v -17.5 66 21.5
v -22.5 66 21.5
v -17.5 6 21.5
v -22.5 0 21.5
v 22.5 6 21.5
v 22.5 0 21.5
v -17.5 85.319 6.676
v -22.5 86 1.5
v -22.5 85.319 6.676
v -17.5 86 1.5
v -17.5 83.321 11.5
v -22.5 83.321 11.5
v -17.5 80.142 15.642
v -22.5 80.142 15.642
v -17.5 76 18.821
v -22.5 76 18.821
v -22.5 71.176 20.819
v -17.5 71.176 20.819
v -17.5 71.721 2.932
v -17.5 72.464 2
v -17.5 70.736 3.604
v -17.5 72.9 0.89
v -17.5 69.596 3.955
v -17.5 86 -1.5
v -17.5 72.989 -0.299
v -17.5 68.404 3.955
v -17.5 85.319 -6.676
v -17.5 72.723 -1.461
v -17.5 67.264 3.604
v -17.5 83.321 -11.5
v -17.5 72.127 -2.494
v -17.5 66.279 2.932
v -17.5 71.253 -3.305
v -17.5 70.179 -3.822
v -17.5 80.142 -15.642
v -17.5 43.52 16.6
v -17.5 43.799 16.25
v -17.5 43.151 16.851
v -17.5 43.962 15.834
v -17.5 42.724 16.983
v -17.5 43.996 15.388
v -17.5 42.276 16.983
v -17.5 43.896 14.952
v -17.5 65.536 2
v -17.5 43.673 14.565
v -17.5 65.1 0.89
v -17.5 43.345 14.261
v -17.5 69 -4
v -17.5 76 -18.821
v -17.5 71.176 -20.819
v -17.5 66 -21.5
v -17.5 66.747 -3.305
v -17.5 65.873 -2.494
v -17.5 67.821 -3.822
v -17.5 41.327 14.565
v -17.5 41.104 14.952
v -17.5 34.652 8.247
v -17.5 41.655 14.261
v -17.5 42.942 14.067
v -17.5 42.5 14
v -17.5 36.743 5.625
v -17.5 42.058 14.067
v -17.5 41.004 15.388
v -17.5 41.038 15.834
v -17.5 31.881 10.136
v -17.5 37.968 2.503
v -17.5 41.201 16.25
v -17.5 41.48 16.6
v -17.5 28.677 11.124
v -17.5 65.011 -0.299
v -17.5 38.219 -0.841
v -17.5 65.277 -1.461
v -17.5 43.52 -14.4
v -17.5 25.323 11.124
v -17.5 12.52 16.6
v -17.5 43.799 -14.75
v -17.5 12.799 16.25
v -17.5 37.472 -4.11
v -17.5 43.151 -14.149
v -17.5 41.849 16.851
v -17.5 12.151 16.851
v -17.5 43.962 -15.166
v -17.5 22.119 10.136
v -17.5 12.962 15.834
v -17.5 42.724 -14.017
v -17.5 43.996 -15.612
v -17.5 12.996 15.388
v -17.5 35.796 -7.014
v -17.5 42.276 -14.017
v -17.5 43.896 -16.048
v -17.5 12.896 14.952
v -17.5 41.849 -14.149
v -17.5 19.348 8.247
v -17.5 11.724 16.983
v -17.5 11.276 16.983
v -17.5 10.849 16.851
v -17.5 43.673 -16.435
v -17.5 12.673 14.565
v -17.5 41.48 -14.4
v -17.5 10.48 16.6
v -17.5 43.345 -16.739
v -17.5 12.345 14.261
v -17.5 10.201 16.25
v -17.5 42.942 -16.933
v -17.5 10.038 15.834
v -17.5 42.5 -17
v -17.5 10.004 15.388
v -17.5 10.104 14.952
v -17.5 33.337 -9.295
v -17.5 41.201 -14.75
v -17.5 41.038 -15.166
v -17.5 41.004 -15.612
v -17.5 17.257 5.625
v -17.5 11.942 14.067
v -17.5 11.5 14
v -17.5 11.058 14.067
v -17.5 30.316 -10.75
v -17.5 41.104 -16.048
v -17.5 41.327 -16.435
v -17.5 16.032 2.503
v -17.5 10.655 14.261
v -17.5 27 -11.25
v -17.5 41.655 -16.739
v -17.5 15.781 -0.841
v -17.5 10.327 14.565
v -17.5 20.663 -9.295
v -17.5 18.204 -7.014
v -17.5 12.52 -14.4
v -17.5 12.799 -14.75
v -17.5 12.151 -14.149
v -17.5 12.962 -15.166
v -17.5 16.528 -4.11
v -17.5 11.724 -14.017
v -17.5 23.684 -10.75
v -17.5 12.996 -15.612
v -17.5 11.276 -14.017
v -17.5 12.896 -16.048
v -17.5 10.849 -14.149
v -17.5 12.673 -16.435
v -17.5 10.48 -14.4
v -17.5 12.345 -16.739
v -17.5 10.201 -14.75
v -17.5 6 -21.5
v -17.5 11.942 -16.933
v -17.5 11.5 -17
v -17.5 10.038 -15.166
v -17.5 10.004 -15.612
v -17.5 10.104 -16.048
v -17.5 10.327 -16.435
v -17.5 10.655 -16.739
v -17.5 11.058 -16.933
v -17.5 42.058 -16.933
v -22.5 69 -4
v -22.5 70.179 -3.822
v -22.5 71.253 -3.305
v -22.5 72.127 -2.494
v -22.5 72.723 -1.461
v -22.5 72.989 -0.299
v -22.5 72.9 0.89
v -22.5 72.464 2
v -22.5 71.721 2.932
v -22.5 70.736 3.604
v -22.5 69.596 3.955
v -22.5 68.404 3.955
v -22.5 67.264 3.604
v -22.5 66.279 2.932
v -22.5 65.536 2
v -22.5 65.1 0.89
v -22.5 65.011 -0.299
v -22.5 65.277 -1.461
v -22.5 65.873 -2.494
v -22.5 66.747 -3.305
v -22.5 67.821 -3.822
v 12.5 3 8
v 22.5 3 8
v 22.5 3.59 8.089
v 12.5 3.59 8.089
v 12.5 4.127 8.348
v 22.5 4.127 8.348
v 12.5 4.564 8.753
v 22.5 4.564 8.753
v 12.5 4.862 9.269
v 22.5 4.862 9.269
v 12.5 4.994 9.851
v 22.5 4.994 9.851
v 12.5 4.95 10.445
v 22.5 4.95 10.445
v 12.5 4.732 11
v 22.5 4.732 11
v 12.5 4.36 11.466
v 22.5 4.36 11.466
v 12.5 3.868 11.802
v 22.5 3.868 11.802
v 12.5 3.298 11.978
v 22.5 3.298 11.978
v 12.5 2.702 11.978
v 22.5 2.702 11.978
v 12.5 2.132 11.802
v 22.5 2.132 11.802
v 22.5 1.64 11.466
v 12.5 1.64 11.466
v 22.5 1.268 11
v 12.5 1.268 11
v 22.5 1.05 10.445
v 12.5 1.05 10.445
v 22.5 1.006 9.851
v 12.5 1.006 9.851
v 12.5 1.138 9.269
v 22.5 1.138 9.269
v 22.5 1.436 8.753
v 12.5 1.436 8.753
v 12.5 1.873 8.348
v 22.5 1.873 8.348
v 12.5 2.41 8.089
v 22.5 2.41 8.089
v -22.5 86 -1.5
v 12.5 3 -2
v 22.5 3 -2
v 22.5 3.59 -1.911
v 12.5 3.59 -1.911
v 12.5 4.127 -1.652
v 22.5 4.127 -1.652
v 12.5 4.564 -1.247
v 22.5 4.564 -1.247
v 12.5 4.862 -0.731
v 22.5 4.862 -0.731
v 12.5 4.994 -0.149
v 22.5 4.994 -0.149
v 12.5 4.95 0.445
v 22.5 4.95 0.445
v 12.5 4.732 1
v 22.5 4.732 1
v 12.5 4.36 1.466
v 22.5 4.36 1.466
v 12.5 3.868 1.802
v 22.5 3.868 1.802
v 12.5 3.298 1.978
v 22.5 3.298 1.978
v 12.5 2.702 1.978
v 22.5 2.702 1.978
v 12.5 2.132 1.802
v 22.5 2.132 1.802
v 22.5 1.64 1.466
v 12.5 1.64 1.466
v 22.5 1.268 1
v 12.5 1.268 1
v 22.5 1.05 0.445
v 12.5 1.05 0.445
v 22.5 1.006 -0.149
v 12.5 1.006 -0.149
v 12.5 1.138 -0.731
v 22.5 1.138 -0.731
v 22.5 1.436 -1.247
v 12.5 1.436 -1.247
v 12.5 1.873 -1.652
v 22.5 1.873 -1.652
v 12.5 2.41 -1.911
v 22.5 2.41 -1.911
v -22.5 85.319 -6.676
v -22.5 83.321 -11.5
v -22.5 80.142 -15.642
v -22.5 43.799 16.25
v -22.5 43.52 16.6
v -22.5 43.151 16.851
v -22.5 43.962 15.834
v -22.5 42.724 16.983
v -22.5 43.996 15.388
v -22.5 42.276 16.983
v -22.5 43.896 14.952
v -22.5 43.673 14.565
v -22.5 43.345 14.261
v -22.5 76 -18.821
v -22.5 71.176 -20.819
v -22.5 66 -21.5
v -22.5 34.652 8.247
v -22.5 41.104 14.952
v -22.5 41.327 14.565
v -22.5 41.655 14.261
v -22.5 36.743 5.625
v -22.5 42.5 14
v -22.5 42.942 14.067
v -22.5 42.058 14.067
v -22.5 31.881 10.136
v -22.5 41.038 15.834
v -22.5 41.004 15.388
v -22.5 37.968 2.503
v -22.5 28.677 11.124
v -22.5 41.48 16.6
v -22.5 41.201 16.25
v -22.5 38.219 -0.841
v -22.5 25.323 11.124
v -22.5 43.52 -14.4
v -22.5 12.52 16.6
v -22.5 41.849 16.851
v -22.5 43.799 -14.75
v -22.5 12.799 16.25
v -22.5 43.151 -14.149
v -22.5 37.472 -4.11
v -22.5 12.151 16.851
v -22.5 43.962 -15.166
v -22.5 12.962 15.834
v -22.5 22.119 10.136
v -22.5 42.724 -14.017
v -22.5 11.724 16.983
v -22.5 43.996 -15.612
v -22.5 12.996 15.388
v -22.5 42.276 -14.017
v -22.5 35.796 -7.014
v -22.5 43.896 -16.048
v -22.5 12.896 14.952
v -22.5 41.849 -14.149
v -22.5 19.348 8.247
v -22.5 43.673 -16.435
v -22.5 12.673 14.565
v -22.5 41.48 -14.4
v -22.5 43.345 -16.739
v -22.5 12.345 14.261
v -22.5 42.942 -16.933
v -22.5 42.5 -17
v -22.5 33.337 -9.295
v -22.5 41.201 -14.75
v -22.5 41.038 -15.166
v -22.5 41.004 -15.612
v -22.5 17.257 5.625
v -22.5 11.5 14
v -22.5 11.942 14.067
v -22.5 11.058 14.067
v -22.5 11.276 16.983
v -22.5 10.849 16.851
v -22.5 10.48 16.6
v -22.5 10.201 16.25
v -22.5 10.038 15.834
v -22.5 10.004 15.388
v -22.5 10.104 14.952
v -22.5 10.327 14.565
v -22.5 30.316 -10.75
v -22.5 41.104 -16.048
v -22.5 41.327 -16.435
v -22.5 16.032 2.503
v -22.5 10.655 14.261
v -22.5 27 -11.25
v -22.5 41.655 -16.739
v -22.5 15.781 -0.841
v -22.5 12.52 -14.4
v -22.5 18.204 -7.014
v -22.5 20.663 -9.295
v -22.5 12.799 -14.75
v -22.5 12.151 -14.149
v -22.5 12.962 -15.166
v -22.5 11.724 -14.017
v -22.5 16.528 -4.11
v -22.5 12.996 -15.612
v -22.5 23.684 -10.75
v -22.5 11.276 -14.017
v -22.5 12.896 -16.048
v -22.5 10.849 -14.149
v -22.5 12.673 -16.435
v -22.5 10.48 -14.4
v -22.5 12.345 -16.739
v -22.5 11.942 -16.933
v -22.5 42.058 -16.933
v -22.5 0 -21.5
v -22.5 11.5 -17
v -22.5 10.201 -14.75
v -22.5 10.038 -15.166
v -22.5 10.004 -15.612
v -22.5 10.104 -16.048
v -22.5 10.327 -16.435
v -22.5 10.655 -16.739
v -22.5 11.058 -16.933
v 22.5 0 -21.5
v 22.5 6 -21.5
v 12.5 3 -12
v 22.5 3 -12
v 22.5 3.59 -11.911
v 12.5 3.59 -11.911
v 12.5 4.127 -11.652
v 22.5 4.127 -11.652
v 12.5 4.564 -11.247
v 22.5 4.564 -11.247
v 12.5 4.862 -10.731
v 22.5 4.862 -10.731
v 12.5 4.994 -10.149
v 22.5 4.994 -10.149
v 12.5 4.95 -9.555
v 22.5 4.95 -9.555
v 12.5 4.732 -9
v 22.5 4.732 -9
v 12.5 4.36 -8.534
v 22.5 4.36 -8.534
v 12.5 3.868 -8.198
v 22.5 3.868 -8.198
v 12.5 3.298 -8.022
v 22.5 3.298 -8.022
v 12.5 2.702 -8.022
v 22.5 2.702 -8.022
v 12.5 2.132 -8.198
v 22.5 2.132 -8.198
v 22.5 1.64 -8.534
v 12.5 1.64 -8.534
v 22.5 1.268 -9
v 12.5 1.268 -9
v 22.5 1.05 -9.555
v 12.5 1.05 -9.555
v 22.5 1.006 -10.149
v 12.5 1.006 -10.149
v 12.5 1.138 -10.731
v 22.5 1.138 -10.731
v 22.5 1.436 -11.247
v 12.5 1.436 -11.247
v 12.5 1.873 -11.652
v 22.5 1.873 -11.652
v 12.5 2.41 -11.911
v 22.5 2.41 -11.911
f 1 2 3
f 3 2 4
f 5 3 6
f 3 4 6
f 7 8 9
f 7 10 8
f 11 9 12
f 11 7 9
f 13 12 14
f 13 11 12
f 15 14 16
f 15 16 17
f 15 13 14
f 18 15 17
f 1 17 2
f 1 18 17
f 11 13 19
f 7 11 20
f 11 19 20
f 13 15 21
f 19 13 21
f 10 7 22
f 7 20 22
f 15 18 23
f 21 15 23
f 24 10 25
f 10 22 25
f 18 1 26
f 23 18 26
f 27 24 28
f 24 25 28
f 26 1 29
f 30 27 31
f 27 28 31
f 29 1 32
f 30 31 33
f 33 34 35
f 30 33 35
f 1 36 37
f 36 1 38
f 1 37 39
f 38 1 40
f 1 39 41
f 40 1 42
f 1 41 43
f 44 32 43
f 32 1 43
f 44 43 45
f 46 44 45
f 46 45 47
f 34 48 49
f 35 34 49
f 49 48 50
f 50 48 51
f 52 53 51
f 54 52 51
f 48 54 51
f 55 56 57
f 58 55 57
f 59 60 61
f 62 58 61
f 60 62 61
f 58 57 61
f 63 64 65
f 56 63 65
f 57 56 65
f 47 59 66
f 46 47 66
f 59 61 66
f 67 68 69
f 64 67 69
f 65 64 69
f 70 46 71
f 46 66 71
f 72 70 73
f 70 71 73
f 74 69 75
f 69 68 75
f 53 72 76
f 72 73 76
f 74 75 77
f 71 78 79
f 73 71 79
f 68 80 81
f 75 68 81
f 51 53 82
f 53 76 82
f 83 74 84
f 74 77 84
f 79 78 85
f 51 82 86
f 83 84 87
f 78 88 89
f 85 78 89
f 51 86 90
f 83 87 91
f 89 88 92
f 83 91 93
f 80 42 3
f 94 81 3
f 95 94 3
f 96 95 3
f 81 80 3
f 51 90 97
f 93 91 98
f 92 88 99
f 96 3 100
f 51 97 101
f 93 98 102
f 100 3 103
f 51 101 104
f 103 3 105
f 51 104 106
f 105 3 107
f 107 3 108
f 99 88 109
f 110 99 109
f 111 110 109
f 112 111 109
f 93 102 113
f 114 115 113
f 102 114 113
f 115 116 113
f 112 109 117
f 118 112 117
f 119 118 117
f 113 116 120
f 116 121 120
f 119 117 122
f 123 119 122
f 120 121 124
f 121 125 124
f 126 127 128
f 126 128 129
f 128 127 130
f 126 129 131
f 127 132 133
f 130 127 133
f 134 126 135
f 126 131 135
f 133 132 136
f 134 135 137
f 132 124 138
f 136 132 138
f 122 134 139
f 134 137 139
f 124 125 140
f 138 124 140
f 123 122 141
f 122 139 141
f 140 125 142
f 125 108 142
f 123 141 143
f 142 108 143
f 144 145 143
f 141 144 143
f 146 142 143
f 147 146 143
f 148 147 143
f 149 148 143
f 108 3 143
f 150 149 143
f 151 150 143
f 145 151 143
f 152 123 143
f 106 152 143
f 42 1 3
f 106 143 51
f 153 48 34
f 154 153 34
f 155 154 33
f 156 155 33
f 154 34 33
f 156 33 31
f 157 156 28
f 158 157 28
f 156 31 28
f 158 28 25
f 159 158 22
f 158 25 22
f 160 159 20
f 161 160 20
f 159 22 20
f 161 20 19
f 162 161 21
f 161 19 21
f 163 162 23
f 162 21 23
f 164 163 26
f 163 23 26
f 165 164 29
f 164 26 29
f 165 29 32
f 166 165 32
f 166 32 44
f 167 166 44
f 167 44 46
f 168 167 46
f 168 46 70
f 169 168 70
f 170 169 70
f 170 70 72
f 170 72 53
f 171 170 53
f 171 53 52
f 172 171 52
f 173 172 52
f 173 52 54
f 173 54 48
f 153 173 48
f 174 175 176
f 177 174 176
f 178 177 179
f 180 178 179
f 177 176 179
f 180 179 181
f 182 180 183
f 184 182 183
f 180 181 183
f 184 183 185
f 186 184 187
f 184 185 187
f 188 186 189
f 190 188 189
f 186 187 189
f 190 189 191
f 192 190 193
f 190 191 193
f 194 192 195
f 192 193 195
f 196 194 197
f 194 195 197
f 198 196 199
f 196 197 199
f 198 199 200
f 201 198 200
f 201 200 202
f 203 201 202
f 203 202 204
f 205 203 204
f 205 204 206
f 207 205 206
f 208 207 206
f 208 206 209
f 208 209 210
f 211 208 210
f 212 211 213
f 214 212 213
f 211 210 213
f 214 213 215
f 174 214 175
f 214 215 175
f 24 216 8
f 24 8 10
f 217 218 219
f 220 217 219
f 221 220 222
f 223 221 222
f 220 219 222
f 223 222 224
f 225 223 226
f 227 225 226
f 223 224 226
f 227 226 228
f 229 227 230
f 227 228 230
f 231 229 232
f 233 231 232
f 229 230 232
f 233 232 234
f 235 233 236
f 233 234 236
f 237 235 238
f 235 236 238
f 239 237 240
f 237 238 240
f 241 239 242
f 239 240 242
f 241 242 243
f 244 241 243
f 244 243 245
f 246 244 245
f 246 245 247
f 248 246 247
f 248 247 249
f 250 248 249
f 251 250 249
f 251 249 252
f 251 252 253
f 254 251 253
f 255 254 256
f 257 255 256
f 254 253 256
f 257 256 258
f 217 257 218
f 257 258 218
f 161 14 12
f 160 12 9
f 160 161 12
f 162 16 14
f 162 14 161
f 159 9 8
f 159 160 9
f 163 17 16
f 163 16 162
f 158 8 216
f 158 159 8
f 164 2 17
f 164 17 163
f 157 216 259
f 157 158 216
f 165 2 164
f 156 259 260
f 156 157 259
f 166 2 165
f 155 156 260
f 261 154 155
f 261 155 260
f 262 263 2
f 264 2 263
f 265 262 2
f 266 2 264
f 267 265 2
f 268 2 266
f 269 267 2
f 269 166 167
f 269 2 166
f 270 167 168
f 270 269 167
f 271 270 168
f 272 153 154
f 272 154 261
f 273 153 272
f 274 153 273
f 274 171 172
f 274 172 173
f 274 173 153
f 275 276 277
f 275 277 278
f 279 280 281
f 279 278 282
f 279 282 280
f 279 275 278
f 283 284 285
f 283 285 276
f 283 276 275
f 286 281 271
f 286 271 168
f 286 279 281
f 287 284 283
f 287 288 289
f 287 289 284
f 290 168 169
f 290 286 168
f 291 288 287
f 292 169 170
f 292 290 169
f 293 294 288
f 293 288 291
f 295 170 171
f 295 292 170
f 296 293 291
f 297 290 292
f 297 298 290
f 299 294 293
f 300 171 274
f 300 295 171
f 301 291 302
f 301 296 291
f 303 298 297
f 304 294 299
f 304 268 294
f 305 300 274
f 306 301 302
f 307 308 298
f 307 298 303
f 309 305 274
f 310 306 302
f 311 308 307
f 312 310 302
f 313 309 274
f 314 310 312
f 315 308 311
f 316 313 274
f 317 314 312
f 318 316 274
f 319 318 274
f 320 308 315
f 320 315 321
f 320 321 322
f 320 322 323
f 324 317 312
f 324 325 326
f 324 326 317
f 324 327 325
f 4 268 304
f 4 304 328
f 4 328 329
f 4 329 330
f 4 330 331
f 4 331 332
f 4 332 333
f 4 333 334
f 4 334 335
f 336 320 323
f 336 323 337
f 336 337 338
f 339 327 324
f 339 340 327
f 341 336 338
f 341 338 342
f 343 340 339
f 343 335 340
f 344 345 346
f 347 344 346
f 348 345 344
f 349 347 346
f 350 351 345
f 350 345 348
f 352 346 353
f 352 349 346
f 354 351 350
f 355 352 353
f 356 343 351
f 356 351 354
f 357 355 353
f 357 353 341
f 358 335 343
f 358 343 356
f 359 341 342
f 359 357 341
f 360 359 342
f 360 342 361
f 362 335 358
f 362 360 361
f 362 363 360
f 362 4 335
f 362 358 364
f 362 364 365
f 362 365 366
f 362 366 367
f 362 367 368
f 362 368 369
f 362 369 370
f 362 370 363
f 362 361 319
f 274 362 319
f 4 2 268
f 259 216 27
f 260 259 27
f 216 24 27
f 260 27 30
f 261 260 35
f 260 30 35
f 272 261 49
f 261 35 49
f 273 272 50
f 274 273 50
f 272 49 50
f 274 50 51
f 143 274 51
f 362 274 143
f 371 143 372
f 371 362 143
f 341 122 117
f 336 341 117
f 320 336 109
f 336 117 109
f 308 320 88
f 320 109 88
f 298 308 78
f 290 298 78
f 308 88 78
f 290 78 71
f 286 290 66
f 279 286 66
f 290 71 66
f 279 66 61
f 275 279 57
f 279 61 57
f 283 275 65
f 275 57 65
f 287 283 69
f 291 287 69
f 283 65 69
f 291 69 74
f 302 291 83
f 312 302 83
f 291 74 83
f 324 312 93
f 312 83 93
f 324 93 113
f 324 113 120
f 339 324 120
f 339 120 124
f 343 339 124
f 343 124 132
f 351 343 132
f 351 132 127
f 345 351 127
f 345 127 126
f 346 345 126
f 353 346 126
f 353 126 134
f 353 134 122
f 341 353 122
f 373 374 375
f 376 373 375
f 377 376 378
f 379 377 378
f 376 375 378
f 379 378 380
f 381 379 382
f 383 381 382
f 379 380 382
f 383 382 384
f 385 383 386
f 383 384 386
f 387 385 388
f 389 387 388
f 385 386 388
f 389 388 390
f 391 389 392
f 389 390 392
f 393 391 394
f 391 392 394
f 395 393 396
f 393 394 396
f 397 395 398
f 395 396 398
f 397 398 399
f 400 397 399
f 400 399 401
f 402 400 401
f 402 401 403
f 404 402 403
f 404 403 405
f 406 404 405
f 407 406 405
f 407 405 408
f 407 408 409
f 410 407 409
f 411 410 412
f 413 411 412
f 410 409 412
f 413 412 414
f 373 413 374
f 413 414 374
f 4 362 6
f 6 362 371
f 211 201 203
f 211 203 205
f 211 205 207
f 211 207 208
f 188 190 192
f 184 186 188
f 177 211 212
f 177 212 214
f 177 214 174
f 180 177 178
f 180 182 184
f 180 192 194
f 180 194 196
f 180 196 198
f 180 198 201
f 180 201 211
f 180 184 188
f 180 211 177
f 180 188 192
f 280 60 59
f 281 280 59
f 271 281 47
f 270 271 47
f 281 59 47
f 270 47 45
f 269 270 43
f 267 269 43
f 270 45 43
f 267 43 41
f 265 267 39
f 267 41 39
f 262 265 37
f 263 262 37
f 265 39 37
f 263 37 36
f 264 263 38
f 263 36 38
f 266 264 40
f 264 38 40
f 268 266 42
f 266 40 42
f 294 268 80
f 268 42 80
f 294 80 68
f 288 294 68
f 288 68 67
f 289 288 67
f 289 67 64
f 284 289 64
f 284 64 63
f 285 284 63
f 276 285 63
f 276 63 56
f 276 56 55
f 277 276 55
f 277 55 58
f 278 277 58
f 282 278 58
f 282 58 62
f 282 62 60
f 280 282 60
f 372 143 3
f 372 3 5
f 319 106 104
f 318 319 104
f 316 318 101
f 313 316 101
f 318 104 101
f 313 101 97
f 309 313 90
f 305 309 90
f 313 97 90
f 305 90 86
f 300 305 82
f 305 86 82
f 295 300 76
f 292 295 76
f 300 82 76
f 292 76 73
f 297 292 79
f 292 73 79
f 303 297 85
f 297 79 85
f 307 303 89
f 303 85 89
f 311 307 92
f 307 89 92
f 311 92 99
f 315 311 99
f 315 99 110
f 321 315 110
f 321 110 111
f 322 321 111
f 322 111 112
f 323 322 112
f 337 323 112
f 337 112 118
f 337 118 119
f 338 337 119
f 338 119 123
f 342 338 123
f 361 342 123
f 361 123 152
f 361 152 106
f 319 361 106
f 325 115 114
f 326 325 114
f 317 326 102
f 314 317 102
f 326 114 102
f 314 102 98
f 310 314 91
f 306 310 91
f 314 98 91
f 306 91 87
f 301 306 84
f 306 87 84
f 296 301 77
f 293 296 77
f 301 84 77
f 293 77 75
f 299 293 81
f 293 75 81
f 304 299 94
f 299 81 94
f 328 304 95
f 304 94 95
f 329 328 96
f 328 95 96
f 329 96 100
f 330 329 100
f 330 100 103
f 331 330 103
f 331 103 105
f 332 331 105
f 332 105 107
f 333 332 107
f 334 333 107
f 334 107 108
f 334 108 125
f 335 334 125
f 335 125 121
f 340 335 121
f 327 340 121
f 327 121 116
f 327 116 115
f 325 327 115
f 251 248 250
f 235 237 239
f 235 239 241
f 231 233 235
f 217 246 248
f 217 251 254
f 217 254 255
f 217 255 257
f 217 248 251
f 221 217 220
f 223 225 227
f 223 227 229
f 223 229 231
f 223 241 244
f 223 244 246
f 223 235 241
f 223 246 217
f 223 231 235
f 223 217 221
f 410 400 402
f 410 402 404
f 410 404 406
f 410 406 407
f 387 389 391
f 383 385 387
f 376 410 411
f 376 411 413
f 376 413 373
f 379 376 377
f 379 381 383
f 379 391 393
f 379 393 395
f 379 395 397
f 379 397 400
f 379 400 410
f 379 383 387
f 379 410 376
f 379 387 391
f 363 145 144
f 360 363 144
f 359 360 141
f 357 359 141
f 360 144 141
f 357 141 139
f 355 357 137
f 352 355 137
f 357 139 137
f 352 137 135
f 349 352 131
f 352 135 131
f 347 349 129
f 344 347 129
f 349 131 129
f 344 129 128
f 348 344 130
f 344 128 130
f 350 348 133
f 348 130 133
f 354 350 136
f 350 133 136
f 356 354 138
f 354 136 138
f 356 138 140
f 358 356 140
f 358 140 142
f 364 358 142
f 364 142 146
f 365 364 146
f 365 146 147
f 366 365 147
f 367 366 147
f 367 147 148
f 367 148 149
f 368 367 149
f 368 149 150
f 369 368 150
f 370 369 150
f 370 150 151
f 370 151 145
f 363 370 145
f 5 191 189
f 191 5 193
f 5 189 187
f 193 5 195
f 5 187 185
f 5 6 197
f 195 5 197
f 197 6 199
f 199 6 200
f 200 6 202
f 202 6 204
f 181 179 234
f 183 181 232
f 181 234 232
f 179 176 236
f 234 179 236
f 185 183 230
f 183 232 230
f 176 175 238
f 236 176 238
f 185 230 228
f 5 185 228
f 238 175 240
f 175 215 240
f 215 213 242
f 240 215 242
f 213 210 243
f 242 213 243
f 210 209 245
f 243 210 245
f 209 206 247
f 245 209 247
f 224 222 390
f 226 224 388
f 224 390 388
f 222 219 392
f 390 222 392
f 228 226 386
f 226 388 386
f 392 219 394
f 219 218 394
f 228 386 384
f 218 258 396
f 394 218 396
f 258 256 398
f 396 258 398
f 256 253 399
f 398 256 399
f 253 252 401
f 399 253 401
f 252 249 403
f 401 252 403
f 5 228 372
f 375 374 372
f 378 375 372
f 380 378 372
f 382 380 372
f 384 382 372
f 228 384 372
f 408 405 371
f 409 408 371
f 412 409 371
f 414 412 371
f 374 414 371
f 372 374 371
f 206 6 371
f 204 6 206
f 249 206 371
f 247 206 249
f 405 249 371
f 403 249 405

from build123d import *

# Parameters (mm, degrees)
SKETCH1_W           = 45
SKETCH1_H           = 43
BOSS_EXTRUDE1_DEPTH = 6
SKETCH2_W           = 5
SKETCH2_H           = 43
BOSS_EXTRUDE2_DEPTH = 80
CUT_EXTRUDE1_REACH  = 99.254
SKETCH3_R           = 11.25
SKETCH3_R_2         = 1.5
CUT_EXTRUDE2_REACH  = 99.254
SKETCH4_R           = 4
FILLET1_R           = 20
SKETCH6_R           = 2
CUT_EXTRUDE4_DEPTH  = 10


with BuildPart() as part:
    # Sketch1 → Boss-Extrude1 (new body)
    with BuildSketch(Plane(origin=(0, 0, 0), x_dir=(1, 0, 0), z_dir=(0, 1, 0))):
        Rectangle(SKETCH1_W, SKETCH1_H)
    extrude(amount=BOSS_EXTRUDE1_DEPTH)

    # Sketch2 → Boss-Extrude2 (add)
    with BuildSketch(Plane(origin=(0, 6, 0), x_dir=(1, 0, 0), z_dir=(0, 1, 0))):
        with Locations((-20, 0)):
            Rectangle(SKETCH2_W, SKETCH2_H)
    extrude(amount=BOSS_EXTRUDE2_DEPTH)

    # Sketch3 → Cut-Extrude1 (cut, up to next)
    with BuildSketch(Plane(origin=(-17.5, 0, 0), x_dir=(0, 0, -1), z_dir=(1, 0, 0)), mode=Mode.PRIVATE) as cut_extrude1_sk1:
        with Locations((0, 27)):
            Circle(SKETCH3_R)
    cut_extrude1_tool1 = extrude(cut_extrude1_sk1.sketch, amount=-CUT_EXTRUDE1_REACH, mode=Mode.PRIVATE) & part.part
    # Sketch3 → Cut-Extrude1 (cut, up to next)
    with BuildSketch(Plane(origin=(-17.5, 0, 0), x_dir=(0, 0, -1), z_dir=(1, 0, 0)), mode=Mode.PRIVATE) as cut_extrude1_sk2:
        with Locations((-15.5, 42.5)):
            Circle(SKETCH3_R_2)
    cut_extrude1_tool2 = extrude(cut_extrude1_sk2.sketch, amount=-CUT_EXTRUDE1_REACH, mode=Mode.PRIVATE) & part.part
    # Sketch3 → Cut-Extrude1 (cut, up to next)
    with BuildSketch(Plane(origin=(-17.5, 0, 0), x_dir=(0, 0, -1), z_dir=(1, 0, 0)), mode=Mode.PRIVATE) as cut_extrude1_sk3:
        with Locations((15.5, 42.5)):
            Circle(SKETCH3_R_2)
    cut_extrude1_tool3 = extrude(cut_extrude1_sk3.sketch, amount=-CUT_EXTRUDE1_REACH, mode=Mode.PRIVATE) & part.part
    # Sketch3 → Cut-Extrude1 (cut, up to next)
    with BuildSketch(Plane(origin=(-17.5, 0, 0), x_dir=(0, 0, -1), z_dir=(1, 0, 0)), mode=Mode.PRIVATE) as cut_extrude1_sk4:
        with Locations((15.5, 11.5)):
            Circle(SKETCH3_R_2)
    cut_extrude1_tool4 = extrude(cut_extrude1_sk4.sketch, amount=-CUT_EXTRUDE1_REACH, mode=Mode.PRIVATE) & part.part
    # Sketch3 → Cut-Extrude1 (cut, up to next)
    with BuildSketch(Plane(origin=(-17.5, 0, 0), x_dir=(0, 0, -1), z_dir=(1, 0, 0)), mode=Mode.PRIVATE) as cut_extrude1_sk5:
        with Locations((-15.5, 11.5)):
            Circle(SKETCH3_R_2)
    cut_extrude1_tool5 = extrude(cut_extrude1_sk5.sketch, amount=-CUT_EXTRUDE1_REACH, mode=Mode.PRIVATE) & part.part
    add(cut_extrude1_tool1.solids().sort_by_distance((-17.5, 27, 0))[0], mode=Mode.SUBTRACT)
    add(cut_extrude1_tool2.solids().sort_by_distance((-17.5, 42.5, 15.5))[0], mode=Mode.SUBTRACT)
    add(cut_extrude1_tool3.solids().sort_by_distance((-17.5, 42.5, -15.5))[0], mode=Mode.SUBTRACT)
    add(cut_extrude1_tool4.solids().sort_by_distance((-17.5, 11.5, -15.5))[0], mode=Mode.SUBTRACT)
    add(cut_extrude1_tool5.solids().sort_by_distance((-17.5, 11.5, 15.5))[0], mode=Mode.SUBTRACT)

    # Sketch4 → Cut-Extrude2 (cut, up to next)
    with BuildSketch(Plane(origin=(-17.5, 0, 0), x_dir=(0, 0, -1), z_dir=(1, 0, 0)), mode=Mode.PRIVATE) as cut_extrude2_sk1:
        with Locations((0, 69)):
            Circle(SKETCH4_R)
    cut_extrude2_tool1 = extrude(cut_extrude2_sk1.sketch, amount=-CUT_EXTRUDE2_REACH, mode=Mode.PRIVATE) & part.part
    add(cut_extrude2_tool1.solids().sort_by_distance((-17.5, 69, 0))[0], mode=Mode.SUBTRACT)

    # Fillet1
    fillet1_edges = [part.edges().sort_by_distance(p)[0] for p in [
        (-20, 86, -21.5),
        (-20, 86, 21.5),
    ]]
    fillet(fillet1_edges, radius=FILLET1_R)

    # Sketch6 → Cut-Extrude4 (cut)
    with BuildSketch(Plane(origin=(22.5, 0, 0), x_dir=(0, 0, -1), z_dir=(1, 0, 0))):
        with Locations((0, 3)):
            Circle(SKETCH6_R)
        with Locations((10, 3)):
            Circle(SKETCH6_R)
        with Locations((-10, 3)):
            Circle(SKETCH6_R)
    extrude(amount=-CUT_EXTRUDE4_DEPTH, mode=Mode.SUBTRACT)


solid = part.part
